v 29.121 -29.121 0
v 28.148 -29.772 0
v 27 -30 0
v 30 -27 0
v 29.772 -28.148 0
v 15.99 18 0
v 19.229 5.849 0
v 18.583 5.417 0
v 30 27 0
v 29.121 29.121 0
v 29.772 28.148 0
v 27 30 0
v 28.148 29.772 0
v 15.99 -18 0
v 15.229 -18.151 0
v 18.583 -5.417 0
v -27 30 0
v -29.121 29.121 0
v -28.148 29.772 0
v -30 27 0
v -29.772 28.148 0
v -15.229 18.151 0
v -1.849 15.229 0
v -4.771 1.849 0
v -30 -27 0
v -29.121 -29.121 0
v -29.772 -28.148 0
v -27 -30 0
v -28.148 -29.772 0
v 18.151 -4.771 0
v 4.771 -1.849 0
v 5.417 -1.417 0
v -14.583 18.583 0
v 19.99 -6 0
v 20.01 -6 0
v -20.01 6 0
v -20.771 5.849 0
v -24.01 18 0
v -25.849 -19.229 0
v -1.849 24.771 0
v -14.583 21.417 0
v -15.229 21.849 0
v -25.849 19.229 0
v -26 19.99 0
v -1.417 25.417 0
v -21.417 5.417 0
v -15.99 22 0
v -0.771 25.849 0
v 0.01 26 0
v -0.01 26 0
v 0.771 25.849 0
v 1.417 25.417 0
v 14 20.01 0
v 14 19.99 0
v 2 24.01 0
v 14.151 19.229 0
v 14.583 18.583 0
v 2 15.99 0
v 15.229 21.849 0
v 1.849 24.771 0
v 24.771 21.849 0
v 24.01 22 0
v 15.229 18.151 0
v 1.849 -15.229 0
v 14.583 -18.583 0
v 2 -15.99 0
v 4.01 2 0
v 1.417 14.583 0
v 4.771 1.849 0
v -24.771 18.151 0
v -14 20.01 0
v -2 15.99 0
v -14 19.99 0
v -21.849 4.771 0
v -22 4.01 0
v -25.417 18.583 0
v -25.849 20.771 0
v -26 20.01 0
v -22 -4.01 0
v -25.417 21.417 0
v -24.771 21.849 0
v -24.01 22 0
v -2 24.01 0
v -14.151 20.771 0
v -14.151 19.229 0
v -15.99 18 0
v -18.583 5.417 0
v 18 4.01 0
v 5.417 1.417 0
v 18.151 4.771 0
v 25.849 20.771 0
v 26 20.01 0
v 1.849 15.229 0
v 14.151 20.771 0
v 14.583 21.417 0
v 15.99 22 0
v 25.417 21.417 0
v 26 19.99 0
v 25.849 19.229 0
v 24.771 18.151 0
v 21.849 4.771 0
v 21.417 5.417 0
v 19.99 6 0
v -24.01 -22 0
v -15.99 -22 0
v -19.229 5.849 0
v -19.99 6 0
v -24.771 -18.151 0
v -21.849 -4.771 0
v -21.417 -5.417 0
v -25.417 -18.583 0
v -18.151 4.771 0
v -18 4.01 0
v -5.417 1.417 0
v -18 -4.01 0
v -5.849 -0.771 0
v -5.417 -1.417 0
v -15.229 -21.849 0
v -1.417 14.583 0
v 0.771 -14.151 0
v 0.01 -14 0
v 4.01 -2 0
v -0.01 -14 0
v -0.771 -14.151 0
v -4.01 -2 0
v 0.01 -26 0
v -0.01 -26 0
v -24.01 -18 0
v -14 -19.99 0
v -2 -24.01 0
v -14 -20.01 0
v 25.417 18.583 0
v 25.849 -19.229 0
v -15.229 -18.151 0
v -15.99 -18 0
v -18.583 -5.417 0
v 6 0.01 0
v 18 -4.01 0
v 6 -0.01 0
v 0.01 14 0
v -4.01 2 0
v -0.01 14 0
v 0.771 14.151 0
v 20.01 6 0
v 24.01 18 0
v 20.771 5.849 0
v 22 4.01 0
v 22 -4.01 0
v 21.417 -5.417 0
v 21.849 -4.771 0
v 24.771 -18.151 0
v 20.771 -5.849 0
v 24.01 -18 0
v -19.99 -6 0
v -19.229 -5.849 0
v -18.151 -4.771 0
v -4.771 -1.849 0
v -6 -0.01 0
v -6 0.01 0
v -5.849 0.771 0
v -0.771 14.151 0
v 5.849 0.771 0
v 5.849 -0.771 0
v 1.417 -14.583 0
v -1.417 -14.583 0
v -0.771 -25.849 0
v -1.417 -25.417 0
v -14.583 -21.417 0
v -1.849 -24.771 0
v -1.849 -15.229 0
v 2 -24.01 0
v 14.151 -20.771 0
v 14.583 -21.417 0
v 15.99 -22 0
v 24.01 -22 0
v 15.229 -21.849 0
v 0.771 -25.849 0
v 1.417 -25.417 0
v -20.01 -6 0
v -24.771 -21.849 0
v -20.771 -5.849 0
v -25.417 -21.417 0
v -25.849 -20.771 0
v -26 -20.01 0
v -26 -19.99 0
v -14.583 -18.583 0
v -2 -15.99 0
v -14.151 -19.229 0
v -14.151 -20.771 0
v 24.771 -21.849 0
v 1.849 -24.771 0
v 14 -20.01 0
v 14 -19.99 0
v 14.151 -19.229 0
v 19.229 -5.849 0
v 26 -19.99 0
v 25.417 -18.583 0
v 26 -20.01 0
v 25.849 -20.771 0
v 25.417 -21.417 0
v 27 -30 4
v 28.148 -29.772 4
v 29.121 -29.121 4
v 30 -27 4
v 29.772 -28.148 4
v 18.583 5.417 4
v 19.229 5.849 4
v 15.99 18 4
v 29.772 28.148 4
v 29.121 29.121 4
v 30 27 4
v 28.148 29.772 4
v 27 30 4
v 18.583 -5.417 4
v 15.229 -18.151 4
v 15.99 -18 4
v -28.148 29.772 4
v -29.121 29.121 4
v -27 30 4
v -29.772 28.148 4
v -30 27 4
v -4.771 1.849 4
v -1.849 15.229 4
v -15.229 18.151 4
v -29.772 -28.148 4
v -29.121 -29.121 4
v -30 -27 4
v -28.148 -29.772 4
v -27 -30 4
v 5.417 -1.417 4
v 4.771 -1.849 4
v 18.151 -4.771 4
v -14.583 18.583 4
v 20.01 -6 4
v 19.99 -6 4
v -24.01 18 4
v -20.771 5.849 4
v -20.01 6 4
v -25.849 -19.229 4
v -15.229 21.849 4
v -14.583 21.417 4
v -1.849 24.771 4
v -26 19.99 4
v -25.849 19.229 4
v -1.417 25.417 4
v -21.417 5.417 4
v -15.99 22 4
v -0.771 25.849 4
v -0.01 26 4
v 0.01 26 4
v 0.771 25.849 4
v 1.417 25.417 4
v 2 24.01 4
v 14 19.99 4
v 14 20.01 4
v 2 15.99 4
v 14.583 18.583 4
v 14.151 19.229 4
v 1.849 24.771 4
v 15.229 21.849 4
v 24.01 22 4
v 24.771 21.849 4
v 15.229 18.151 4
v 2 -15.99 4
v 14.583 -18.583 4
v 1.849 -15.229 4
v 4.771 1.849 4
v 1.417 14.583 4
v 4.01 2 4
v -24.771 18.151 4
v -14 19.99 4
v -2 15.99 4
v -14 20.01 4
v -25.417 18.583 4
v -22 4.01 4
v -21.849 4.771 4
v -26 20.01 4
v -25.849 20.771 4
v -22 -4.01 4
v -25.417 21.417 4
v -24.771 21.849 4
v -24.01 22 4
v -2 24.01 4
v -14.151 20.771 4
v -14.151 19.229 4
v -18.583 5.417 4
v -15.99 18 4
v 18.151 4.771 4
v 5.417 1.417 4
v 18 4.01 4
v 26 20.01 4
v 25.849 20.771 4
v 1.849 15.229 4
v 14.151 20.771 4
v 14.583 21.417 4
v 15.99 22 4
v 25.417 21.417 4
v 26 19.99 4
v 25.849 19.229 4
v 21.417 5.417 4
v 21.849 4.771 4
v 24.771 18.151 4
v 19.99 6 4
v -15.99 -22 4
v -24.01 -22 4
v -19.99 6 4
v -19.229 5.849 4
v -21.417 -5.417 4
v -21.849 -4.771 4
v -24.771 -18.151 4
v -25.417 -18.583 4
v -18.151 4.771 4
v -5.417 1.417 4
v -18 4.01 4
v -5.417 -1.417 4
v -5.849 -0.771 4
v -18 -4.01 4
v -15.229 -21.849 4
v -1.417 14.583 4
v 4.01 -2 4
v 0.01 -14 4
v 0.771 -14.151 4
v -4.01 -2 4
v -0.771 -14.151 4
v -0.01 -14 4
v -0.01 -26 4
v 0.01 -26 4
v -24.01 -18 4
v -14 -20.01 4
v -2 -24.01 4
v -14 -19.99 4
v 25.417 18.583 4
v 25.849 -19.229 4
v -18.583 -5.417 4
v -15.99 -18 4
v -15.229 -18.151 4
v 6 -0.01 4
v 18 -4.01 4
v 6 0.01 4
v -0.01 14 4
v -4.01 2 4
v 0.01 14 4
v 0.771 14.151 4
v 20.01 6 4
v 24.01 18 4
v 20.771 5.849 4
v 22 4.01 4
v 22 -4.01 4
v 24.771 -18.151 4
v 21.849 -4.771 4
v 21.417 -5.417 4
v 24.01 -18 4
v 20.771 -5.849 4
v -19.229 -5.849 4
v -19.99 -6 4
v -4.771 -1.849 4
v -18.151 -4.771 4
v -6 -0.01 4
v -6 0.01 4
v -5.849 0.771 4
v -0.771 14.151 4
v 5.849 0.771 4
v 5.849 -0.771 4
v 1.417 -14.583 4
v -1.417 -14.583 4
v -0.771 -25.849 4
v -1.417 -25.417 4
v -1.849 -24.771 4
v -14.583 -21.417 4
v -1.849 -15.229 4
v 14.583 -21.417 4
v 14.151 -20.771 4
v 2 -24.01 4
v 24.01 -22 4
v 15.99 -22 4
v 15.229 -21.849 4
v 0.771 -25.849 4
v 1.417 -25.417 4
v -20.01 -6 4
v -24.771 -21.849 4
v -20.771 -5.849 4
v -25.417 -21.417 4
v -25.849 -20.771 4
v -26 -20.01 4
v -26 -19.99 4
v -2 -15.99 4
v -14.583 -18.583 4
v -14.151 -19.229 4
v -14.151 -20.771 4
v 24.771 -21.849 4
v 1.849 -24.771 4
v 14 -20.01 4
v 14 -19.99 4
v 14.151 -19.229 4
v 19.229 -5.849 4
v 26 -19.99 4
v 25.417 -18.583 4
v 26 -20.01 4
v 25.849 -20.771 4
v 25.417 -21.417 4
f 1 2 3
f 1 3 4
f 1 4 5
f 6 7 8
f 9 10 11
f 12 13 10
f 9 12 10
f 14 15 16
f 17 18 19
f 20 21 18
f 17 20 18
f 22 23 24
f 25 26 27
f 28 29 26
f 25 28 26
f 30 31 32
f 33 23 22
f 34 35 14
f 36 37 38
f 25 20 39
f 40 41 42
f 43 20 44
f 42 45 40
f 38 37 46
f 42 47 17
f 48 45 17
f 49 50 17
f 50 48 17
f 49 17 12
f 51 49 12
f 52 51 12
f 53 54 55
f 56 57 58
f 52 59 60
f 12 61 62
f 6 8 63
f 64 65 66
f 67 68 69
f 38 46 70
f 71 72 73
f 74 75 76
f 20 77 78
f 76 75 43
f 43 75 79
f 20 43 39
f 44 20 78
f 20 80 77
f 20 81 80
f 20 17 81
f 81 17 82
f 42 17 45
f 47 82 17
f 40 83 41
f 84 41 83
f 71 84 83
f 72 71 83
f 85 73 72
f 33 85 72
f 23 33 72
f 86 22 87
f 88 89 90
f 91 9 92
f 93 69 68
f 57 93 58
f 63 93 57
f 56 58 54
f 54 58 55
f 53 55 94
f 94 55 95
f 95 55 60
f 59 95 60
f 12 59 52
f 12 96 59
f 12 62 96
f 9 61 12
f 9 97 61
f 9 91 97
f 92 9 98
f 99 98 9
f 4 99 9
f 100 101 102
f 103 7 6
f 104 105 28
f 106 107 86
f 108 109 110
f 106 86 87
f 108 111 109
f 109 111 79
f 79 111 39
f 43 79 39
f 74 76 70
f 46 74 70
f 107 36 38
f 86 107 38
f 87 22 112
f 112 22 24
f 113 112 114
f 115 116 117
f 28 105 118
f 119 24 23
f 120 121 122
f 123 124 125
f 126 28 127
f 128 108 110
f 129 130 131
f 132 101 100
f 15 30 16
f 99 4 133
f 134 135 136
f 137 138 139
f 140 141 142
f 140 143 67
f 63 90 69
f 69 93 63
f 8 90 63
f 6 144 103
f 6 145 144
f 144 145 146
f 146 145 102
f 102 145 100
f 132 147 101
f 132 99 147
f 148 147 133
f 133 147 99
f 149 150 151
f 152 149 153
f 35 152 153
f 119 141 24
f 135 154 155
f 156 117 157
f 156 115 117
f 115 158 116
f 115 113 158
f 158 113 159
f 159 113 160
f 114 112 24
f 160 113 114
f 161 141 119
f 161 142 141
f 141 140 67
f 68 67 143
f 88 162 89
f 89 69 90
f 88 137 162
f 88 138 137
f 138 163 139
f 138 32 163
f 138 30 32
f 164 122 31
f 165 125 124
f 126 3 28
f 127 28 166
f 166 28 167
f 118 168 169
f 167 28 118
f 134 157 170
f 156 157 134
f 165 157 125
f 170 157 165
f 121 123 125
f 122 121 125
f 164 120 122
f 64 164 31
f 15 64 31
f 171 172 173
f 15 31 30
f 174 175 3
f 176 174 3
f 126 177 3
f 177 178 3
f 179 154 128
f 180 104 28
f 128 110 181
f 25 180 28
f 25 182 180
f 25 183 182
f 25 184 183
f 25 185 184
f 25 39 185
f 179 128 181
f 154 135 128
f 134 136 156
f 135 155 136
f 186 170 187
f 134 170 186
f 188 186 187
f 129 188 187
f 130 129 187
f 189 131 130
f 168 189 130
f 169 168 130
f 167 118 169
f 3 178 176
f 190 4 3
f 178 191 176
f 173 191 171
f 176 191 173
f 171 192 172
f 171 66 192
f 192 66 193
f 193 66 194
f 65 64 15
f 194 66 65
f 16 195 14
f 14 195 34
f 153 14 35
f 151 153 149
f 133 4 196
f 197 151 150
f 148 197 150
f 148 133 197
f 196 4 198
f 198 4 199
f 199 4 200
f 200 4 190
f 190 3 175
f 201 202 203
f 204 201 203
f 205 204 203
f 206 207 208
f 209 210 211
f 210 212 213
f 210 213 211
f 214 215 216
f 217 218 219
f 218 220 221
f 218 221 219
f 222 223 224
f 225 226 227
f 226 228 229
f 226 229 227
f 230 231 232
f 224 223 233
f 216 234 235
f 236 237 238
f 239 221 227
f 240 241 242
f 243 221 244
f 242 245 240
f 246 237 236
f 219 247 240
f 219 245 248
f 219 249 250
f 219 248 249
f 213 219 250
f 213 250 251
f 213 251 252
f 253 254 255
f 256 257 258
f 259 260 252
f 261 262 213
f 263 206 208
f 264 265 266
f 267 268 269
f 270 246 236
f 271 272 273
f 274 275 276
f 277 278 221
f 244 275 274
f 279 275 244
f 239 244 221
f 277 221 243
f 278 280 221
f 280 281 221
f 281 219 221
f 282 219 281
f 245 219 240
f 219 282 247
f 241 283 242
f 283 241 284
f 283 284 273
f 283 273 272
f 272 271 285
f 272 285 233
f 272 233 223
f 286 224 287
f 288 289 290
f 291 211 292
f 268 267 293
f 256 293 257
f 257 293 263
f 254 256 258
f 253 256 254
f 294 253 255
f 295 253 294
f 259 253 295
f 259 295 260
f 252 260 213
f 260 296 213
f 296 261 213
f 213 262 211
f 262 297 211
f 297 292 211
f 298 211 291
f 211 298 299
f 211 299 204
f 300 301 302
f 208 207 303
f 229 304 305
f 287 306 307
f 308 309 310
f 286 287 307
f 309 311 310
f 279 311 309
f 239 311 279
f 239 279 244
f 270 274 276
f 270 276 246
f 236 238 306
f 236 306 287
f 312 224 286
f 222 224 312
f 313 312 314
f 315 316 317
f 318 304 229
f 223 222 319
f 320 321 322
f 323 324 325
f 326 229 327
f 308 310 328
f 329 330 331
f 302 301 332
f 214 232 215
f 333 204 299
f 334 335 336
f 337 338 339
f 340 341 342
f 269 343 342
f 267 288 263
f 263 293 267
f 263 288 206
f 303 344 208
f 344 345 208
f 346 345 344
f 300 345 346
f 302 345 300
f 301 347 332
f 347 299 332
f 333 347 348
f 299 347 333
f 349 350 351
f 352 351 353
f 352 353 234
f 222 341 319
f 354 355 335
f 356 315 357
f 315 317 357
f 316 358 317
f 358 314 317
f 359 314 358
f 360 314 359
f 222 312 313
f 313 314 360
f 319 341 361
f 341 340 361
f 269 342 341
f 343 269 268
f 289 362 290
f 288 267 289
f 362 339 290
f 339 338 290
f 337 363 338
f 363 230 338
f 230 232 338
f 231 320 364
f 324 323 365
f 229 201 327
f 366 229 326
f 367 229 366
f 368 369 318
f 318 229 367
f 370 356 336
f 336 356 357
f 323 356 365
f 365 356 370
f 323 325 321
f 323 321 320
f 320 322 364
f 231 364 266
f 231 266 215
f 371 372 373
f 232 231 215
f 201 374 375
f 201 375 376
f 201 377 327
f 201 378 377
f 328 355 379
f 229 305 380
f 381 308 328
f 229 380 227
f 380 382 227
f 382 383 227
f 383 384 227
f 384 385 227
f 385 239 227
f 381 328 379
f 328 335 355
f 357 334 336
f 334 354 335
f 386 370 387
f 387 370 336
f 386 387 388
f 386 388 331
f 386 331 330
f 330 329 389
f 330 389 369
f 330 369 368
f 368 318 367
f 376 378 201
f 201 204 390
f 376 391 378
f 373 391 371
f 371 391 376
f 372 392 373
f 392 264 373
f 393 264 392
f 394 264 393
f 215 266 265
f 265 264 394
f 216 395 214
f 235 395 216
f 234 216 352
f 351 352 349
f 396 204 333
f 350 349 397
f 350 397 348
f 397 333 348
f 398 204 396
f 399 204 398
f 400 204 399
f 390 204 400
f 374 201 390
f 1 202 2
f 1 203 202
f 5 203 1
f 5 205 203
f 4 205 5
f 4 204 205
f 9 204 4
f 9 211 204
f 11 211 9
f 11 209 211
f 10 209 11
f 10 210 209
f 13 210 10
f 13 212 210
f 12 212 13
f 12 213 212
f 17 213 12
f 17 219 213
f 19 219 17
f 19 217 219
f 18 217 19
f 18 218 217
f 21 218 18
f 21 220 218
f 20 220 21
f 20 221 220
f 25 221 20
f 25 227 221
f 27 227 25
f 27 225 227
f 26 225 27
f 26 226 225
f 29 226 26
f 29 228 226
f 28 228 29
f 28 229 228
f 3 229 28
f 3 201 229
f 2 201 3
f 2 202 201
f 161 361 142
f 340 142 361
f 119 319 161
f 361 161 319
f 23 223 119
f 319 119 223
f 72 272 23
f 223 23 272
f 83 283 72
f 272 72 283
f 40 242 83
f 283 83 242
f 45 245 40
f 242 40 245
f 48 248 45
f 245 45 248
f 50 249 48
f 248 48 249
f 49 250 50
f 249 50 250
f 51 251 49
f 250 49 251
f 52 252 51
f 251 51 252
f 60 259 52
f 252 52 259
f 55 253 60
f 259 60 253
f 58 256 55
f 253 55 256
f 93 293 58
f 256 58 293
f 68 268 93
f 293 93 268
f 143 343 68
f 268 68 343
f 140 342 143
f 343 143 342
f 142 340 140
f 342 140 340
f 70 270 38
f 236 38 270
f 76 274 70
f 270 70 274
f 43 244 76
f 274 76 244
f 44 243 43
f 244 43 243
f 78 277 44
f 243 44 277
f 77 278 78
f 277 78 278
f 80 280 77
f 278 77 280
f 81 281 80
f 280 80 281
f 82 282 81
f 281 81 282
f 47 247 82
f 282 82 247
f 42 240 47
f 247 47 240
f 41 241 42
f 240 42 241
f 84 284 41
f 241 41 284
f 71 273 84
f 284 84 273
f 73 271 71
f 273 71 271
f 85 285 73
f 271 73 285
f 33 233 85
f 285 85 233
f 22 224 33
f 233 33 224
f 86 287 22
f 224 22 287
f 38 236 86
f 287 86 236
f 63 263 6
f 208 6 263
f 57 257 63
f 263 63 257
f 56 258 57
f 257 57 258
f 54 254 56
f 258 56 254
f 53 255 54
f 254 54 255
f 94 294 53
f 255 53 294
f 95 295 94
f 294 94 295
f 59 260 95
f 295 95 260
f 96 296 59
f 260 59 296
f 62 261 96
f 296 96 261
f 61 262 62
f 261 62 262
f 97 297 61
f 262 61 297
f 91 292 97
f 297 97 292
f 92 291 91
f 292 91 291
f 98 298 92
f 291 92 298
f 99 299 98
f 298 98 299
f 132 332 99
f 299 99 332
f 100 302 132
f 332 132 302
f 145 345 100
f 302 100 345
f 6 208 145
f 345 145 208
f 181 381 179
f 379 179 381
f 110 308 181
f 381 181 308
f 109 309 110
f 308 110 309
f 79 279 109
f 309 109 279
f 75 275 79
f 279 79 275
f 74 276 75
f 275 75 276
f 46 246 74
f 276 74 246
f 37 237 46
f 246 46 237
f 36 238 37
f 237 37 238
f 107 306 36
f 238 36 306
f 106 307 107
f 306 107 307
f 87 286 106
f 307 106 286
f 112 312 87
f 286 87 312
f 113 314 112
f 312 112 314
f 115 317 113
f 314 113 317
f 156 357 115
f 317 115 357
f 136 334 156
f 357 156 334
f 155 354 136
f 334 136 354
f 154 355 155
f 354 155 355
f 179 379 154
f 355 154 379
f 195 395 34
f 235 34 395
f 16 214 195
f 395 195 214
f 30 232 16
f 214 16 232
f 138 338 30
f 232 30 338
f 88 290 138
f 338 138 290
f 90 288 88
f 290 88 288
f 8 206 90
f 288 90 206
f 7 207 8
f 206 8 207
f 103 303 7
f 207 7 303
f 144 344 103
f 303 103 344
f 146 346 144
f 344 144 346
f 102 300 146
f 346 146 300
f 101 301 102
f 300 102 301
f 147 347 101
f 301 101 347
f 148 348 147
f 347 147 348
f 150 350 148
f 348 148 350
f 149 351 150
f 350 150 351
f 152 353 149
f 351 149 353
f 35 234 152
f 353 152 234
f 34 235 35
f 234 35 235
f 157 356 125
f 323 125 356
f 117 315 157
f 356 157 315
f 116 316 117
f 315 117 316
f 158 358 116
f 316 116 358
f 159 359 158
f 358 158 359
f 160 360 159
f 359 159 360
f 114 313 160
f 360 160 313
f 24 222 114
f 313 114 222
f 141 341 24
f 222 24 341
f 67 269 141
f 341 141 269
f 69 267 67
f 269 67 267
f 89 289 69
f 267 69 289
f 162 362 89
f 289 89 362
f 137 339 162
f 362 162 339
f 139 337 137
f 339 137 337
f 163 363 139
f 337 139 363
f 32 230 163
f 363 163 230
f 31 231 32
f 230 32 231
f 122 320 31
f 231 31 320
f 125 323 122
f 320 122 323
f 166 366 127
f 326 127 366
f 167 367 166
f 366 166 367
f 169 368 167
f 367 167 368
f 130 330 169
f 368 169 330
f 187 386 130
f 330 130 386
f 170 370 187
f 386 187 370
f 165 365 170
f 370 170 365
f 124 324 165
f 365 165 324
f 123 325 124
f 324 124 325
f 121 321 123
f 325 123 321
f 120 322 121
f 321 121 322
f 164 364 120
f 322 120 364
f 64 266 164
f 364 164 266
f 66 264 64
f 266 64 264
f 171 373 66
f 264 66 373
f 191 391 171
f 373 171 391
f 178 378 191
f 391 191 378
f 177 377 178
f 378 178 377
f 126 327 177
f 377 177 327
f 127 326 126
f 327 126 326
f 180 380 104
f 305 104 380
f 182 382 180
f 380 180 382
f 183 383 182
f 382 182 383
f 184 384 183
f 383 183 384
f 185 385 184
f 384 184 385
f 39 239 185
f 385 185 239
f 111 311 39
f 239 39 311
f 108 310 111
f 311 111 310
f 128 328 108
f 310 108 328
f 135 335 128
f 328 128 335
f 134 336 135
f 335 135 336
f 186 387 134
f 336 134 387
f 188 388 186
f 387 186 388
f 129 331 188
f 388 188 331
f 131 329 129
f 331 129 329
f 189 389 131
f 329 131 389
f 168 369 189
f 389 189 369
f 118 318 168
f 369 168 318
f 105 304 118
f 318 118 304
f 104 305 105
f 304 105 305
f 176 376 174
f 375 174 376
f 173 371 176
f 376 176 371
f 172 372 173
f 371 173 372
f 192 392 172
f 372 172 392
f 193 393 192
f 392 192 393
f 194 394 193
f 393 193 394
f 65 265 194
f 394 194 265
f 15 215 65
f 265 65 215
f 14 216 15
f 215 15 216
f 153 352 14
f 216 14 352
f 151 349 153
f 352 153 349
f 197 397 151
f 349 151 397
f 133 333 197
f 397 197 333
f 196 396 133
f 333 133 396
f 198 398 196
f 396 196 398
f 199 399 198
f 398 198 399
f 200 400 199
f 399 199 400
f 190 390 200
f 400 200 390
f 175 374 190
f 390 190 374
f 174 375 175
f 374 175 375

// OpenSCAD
// file: ../lib/TOGComplexLib1.scad
function tcplx1_multiply(a, b) =
	[a[0]*b[0] - a[1]*b[1], a[0]*b[1] + a[1]*b[0]];
function tcplx1_divide(a, b) =
	let(bot = (b[0]*b[0] + b[1]*b[1]))
	[
		(a[0]*b[0] + a[1]*b[1])/bot,
		(a[1]*b[0] - a[0]*b[1])/bot
	];

assert([-11,23] == tcplx1_multiply([3,2], [1,7]));

assert([-1,3] == tcplx1_multiply([3,1], [0,1]));
assert([-1,3] == tcplx1_multiply([0,1], [3,1]));

echo(tcplx1_divide([-1,3], [3,1]));
assert([0,1] == tcplx1_divide([-1,3], [3,1]));

function tcplx1_normalize(vec) =
	let(veclen = sqrt(vec[0]*vec[0]+vec[1]*vec[1]))
	[vec[0] / veclen, vec[1] / veclen];

function tcplx1_relative_turnvec_vv(v0, v1) =
	tcplx1_divide(tcplx1_normalize(v1), tcplx1_normalize(v0));

function tcplx1_relative_turnvec_abc(p0, p1, p2) = tcplx1_relative_turnvec_vv(p1-p0, p2-p1);

// A 90-degree turn
assert([0,1] == tcplx1_relative_turnvec_abc([0,0], [1,0], [1,1]));
assert([0,1] == tcplx1_relative_turnvec_abc([0,0], [0,1], [-1,1]));

// A 45-degree turn
assert(tcplx1_normalize([1,1]) == tcplx1_relative_turnvec_abc([0,0], [1,0], [ 2,1]));
assert(tcplx1_normalize([1,1]) == tcplx1_relative_turnvec_abc([0,0], [0,1], [-1,2]));


function tcplx1_relative_angle_abc(p0, p1, p2) =
	let(turnvec = tcplx1_relative_turnvec_abc(p0, p1, p2))
	atan2(turnvec[1], turnvec[0]);

assert(-135 == tcplx1_relative_angle_abc([0,0], [1,0], [0,-1]));
assert( -90 == tcplx1_relative_angle_abc([0,0], [1,0], [1,-1]));
assert(   0 == tcplx1_relative_angle_abc([0,0], [1,0], [2, 0]));
assert(  90 == tcplx1_relative_angle_abc([0,0], [1,0], [1, 1]));
assert( 135 == tcplx1_relative_angle_abc([0,0], [1,0], [0, 1]));

assert(  90 == tcplx1_relative_angle_abc([1,1], [3,3], [1, 5]));
// file: ../lib/TOGArrayLib1.scad
// TOGArrayLib1.5
// 
// Functions for working with arrays.
// 
// v1.1:
// - tal1_reduce assert(is_list(items)) to prevent infinite recursion
//   when given undefined or other non-list values
// v1.1.1:
// - Fix tal1_uniq_remap_v2 to return "list-remap-result" as the
//   first element of the returned list
// v1.2:
// - Add tal1_replace_at function
// v1.3:
// - tal1_is_vec_of, tal1_is_vec_of_num
// v1.4:
// - tal1_assert_for_each, for when you want to assert something
//   about each of a list of items and get nice failure messages
// v1.5:
// - Add tal1_duplicate_reversed function, which may be
//   handy when generating symmetrical polygons and stuff.

/**
 * Make a list with the contents of list `a`,
 * but starting at offset `off`, replaced by the contents of list `b`.
 * len(result) = max(len(a), off+len(b))
 */
function tal1_replace_at(a, off, b, default_value=undef, default_value_function=undef) =
	assert(is_list(a))
	assert(is_list(b))
	let( _dvf = !is_undef(default_value_function) ? default_value_function : function(i) default_value )
[
	for( i=[0:1:min(off,len(a))-1] ) a[i],
	for( i=[len(a):1:off-1] ) _dvf(i),
	for( i=[off:1:off+len(b)-1] ) b[i-off],
	for( i=[off+len(b):1:len(a)-1] ) a[i],
];

// Simplest case
assert([] == tal1_replace_at([], 0, []));
// Second simplest cases
assert(["foo"] == tal1_replace_at(["foo"], 0, []));
assert(["foo"] == tal1_replace_at([], 0, ["foo"]));
// Replace one item
assert(["foo","quux","baz"] == tal1_replace_at(["foo","bar","baz"], 1, ["quux"]));
// Replace and extend
assert(["foo","quux","tuna","tina"] == tal1_replace_at(["foo","bar","baz"], 1, ["quux", "tuna", "tina"]));
// Add beyond end of `a`
assert(["foo","zzz","quux"] == tal1_replace_at(["foo"], 2, ["quux"], default_value="zzz"));
// Adding 'nothing' should still fill to that point with defaults
assert(["foo","zzz","zzz"] == tal1_replace_at(["foo"], 3, [], default_value="zzz"));


function tal1_reduce(start, items, func, offset=0) =
	assert(is_list(items))
	len(items) == offset ? start :
	tal1_reduce(func(start, items[offset]), items, func, offset+1);

function tal1_consecutive_duplicate_count(items) = tal1_reduce(
	[0, undef],
	items,
	function(z,item) [z[0] + (item == z[1] ? 1 : 0), item]
)[0];

assert(0 == tal1_consecutive_duplicate_count([]));
assert(0 == tal1_consecutive_duplicate_count([50]));
assert(1 == tal1_consecutive_duplicate_count([50,50]));
assert(0 == tal1_consecutive_duplicate_count([50,51,52,53]));
assert(1 == tal1_consecutive_duplicate_count([50,51,52,52]));
assert(3 == tal1_consecutive_duplicate_count([50,50,50,50]));

// Set test_size to arbirarily large values
// to ensure that OpenSCAD can handle heavy recursion
let(test_size=1000) assert(test_size/2 == tal1_consecutive_duplicate_count([for(i=[0:1:test_size-1]) floor(i/2)]));



function tal1_uniq_(items, off0, off1) =
	let(chunklen = off1-off0)
	chunklen == 0 ? [] :
	chunklen == 1 ? [items[off0]] :
	let(half=floor(chunklen/2))
	let(left  = tal1_uniq_(items, off0     , off0+half))
	let(right = tal1_uniq_(items, off0+half, off1     ))
	assert(len(left) > 0)
	assert(len(right) > 0)
	left[len(left)-1] == right[0] ? [each left, for(i=[1:1:len(right)-1]) right[i]] :
	[each left, each right];

/** Given a list of items, returns a new list with identical consecutive items merged */
function tal1_uniq(items) = tal1_uniq_(items, 0, len(items));

assert([] == tal1_uniq([]));
assert([123] == tal1_uniq([123]));
assert([55,0,1,2,3] == tal1_uniq([55,0,1,2,3]));
assert([55,0,1,2] == tal1_uniq([55,0,1,1,2]));
assert([55,0,1] == tal1_uniq([55,55,0,0,0,0,0,0,1,1,1,1]));
assert([55,0] == tal1_uniq([55,0,0,0,0,0,0,0]));



/**
 * Returns [new items, old index -> new index mapping].
 * No-op version.
 */
function tal1_uniq_remap_v1(items) =
	["list-remap-result", items, [for (vi=[0:1:len(items)-1]) vi]];

// [a, a, b, b, c, c]
//
// [a,    ...], []  -> [a],[0]
// [a, a, ...], [0] -> [a],[0,0]

assert([1,2,3] == [1,2,3]);

/**
 * Recursive version that will combine adjacent identical vertexes,
 * but will use the original items.
 */
function tal1_uniq_remap_v2(items, map=[]) =
	let(index = len(map))
	len(items) == index ? ["list-remap-result", items, map] :
	index == 0 ? tal1_uniq_remap_v2(items, [0]) :
	items[index] == items[map[index-1]] ? tal1_uniq_remap_v2(items, [for(vi=map) vi, map[index-1]]) :
	tal1_uniq_remap_v2(items, [for(vi=map) vi, index]);

assert(tal1_uniq_remap_v2([1,1,2,2,3,4]) == ["list-remap-result", [1,1,2,2,3,4], [0,0,2,2,4,5]]);


/**
 * Returns true if `vec` is a list of at least min_len items
 * and component_check(each item, even those beyond min_len) is true.
 */
function tal1_is_vec_of(vec, min_len=0, component_check=function(x) true) =
	assert(is_num(min_len) && min_len >= 0)
	assert(is_function(component_check))
	is_list(vec) && len(vec) >= min_len &&
	tal1_reduce(true, vec, function(prev,item) prev && component_check(item));

function tal1_is_vec_of_num(vec, min_len=0) = tal1_is_vec_of(vec, min_len, function(i) is_num(i));

assert( true == tal1_is_vec_of_num([1,2,3]));
assert( true == tal1_is_vec_of_num([]));
assert( true == tal1_is_vec_of_num([1,2,3], 3));
assert(false == tal1_is_vec_of_num([1,2], 3));
assert(false == tal1_is_vec_of_num([1,2,"spoon"], 3));
// Requirements are ambiguous when
// first min_len items are numbers, but there are non-numeric items afterwards,
// so let's error on the side of saying 'no, it's not a list of numbers';
// i.e. the item check and the min_len are independent.
assert(false == tal1_is_vec_of_num([1,2,3,"artichoke"], 3));


/**
 * Asserts that item_checker(each item in list, index of item)[0] is true.
 * Second element of item_checker return value is assertion message.
 * Returns the original list, in case that's useful to you.
 */
function tal1_assert_for_each(list, item_checker) =
	let( _ignored = [ for(i=[0:1:len(list)-1])
		let(q=item_checker(list[i],i))
		let(passed=is_bool(q) ? q : is_list(q) ? q[0] : assert(false, str(
			"tal1_assert_for_each: item_checker should return Bool|[Bool,String], but returned ",
			q, " for item at index ", i)))
		let(message=is_list(q) ? q[1] : undef)
		assert(passed, message)
		q
	])
	list;

// Callback can return a boolean...
assert([1,2,3] == tal1_assert_for_each([1,2,3], function(v,i) is_num(v)));
// ...or a [boolean, string]
assert([1,2,3] == tal1_assert_for_each([1,2,3], function(v,i) [is_num(v), "element be a num"]));

// [a, b, c] -> [a, b, c, rxf(c), rxf(b), rxf(a)]
function tal1_duplicate_reversed(list, rxf=function(item) item) =
	[
		each list,
		for( i=[len(list)-1 : -1 : 0] ) rxf(list[i]),
	];
// file: ../lib/TOGMod1Constructors.scad
// TOGMod1Constructors-v1.11
// 
// Functions to construct objects understood by TOGMod1
// 
// v1.1:
// - Add togmod1_make_rounded_rect
// v1.2:
// - togmod1_make_rounded_rect can make ovals
// v1.3:
// - togmod1_circle_points, to just get the points of a circle
// - if pos parameter to circle function has a third element,
//   returned vertexes will include it as the z component;
// v1.3.1
// - Some assertions
// v1.4:
// - Refactor togmod1_rounded_rect_points and togmod1_circle_points
//   to use togmod1__make_nd_vector_adder for adapting to whatever
//   `pos` parameter is.
// v1.5:
// - togmod_rounded_rect_points will not simplify completely rounded sides
//   (where length of side is exactly twice the rounding radius)
//   unless simplify_rounded_sides=true
//   - This makes it more useful for polyhedron generation,
//     where radius varies, but number of points must remain constant.
// v1.6:
// - togmod1_make_rect makes a simple rectangle
// - togmod1_make_rounded_rect will defer to togmod1_make_rect when r=0
// v1.7:
// - togmod1_make_circle will return empty shape (["union"]) when d=0
// v1.8:
// - Add togmod1_text
// v1.9:
// - togmod1_circle_points uses 3 as minimum circle point count instead of 6
// v1.10:
// - Fix togmod1_linear_extrude_y so that range corresponds to Y start/end and
//   polygon X,Y correspond to X,Z.  Previously it was rotated wrongly,
//   which would have gone unnoticed for symmetrical shapes centered at 0,0.
// v1.11:
// - Remove an 'echo'

use <./TOGArrayLib1.scad>

function togmod1__make_nd_vector_adder(origin=[0,0]) =
	let(origin_is_zero = tal1_reduce(true, origin, function(prev,item) prev && item == 0))
	origin_is_zero ? (function(vec) len(vec) >= len(origin) ? vec : tal1_replace_at(origin, 0, vec)) :
	function(vec) [
		for(i=[0:1:max(len(origin),len(vec))-1]) (len(vec) > i ? vec[i] : 0) + (len(origin) > i ? origin[i] : 0),
	];

assert([1,2,3] == togmod1__make_nd_vector_adder()([1,2,3]));
assert([1,2,3] == togmod1__make_nd_vector_adder([0,0,3])([1,2]));


function togmod1_make_cuboid(size) =
	assert(is_list(size))
	assert(len(size) >= 3)
	assert(is_num(size[0]))
	assert(is_num(size[1]))
	assert(is_num(size[2]))
	["polyhedron-vf", [
		[-size[0]/2, -size[1]/2, -size[2]/2],
		[+size[0]/2, -size[1]/2, -size[2]/2],
		[-size[0]/2, +size[1]/2, -size[2]/2],
		[+size[0]/2, +size[1]/2, -size[2]/2],
		[-size[0]/2, -size[1]/2, +size[2]/2],
		[+size[0]/2, -size[1]/2, +size[2]/2],
		[-size[0]/2, +size[1]/2, +size[2]/2],
		[+size[0]/2, +size[1]/2, +size[2]/2]
	], [
		[0,1,3,2],[0,4,5,1],[4,6,7,5],[3,7,6,2],[1,5,7,3],[6,4,0,2]
	]];

function togmod1_make_polygon(verts) =
	["polygon-vp", verts, [[for( i=[0:1:len(verts)-1] ) i%len(verts)]]];

function togmod1_rounded_rect_points(size, r, pos=[0,0], simplify_rounded_sides=false) =
	assert(is_list(size))
	assert(len(size) >= 2)
	let(radii = is_list(r) ? r : is_num(r) ? [r,r] : assert(false, "rounded_rect r(adius) should be list<num> or num"))
	let(rx = radii[0])
	let(ry = radii[1])
	assert(is_num(rx))
	assert(is_num(ry))
	assert(size[0] >= 2*rx, str("size[0] must be >= 2*r[0]; size[0] = ",size[0],", 2*r[0] = ",2*rx))
	assert(size[1] >= 2*ry, str("size[1] must be >= 2*r[1]; size[1] = ",size[1],", 2*r[1] = ",2*ry))
	let(quarterfn=max($fn/4, 1))
	let(qfnx = simplify_rounded_sides && size[0] == 2*rx ? quarterfn-1 : quarterfn)
	let(qfny = simplify_rounded_sides && size[1] == 2*ry ? quarterfn-1 : quarterfn)
	let(finalizepos = togmod1__make_nd_vector_adder(pos))
[
	for(a=[0 : 1 : qfnx]) let(ang=      a*90/quarterfn) finalizepos([ size[0]/2-rx + rx*cos(ang),  size[1]/2-ry + ry*sin(ang)]),
	for(a=[0 : 1 : qfny]) let(ang= 90 + a*90/quarterfn) finalizepos([-size[0]/2+rx + rx*cos(ang),  size[1]/2-ry + ry*sin(ang)]),
	for(a=[0 : 1 : qfnx]) let(ang=180 + a*90/quarterfn) finalizepos([-size[0]/2+rx + rx*cos(ang), -size[1]/2+ry + ry*sin(ang)]),
	for(a=[0 : 1 : qfny]) let(ang=270 + a*90/quarterfn) finalizepos([ size[0]/2-rx + rx*cos(ang), -size[1]/2+ry + ry*sin(ang)]),
];

function togmod1_make_rect(size) =
	togmod1_make_polygon([
		[-size[0]/2, -size[1]/2],
		[+size[0]/2, -size[1]/2],
		[+size[0]/2, +size[1]/2],
		[-size[0]/2, +size[1]/2],
	]);

function togmod1_make_rounded_rect(size, r) =
	r == 0 ? togmod1_make_rect(size) :
	togmod1_make_polygon(togmod1_rounded_rect_points(size,r,simplify_rounded_sides=true));

/**
 * Returns points for an approximation of a circle where points are at distance r from pos.
 * Can be used to make other regular polygons, but the faces will be less than that
 * distance from pos (do some trig if you want face distance, e.g. for a hex nut).
 */
function togmod1_circle_points(r, pos=[0,0], d=undef) =
	assert( !is_undef(r) || !is_undef(d) )
	assert(!is_undef(pos[0]))
	assert(!is_undef(pos[1]))
	let(finalizepos = togmod1__make_nd_vector_adder(pos))
	let(r_ = !is_undef(r) ? r : d/2)
	let(fn = max($fn, 3))
	[for(i=[0 : 1 : fn-1]) finalizepos([r_*cos(i*360/fn), r_*sin(i*360/fn)])];

function togmod1_make_circle(r, pos=[0,0], d=undef) =
	r == 0 || d == 0 ? ["union"] :
	togmod1_make_polygon(togmod1_circle_points(r=r, pos=pos, d=d));

function togmod1_make_cylinder(d, zrange=[0,1], r=undef, pos=[0,0]) =
	assert( !is_undef(r) || !is_undef(d) )
	let( r_ = !is_undef(r) ? r : d/2 )
	// TODO: Make polyhedron directly
	["linear-extrude-zs", zrange, togmod1_make_circle(r=r_, pos=pos)];

function togmod1__is_range1d(range) = is_list(range) && len(range) == 2 && is_num(range[0]) && is_num(range[1]);

function togmod1_linear_extrude_z(range, shape) =
	assert(togmod1__is_range1d(range))
	["linear-extrude-zs", range, shape];
function togmod1_linear_extrude_x(range, shape) =
	assert(togmod1__is_range1d(range))
	["rotate", [90, 0, 90], togmod1_linear_extrude_z(range, shape)];
function togmod1_linear_extrude_y(range, shape) =
	assert(togmod1__is_range1d(range))
	["rotate", [90, 0,  0], togmod1_linear_extrude_z([-range[1], -range[0]], shape)];

function togmod1_text(text, size, font, halign, valign, spacing, direction, language, script) =
	["text-tsfhvsdls", text, size, font, halign, valign, spacing, direction, language, script];
// file: ../lib/TOGMod1.scad
// TOGMod1.9
// OpenSCAD library for representing shapes
// 
// See also: Functional OpenSCAD (https://github.com/thehans/FunctionalOpenSCAD)
// 
// v1.8:
// - Add `text-tsfhvsdls`
// v1.9
// - Add `offset-ds` (offset with _d_elta a _s_hape)

module togmod1_domodule(mod) {
	assert(is_list(mod));
	assert(len(mod) > 0);
	if( mod[0] == "polygon-vp" ) {
		// ["polygon-vp", vertexes, paths]
		polygon(points=mod[1], paths=mod[2]);
	} else if( mod[0] == "polyhedron-vf" ) {
		polyhedron(mod[1], faces=mod[2]);
	} else if( mod[0] == "scale" ) {
		assert(len(mod) == 3);
		scale(mod[1]) togmod1_domodule(mod[2]);
	} else if( mod[0] == "translate" ) {
		assert(len(mod) == 3);
		assert(is_list(mod[1]));
		for(c=mod[1]) assert(is_num(c), "translate component should be numeric");
		translate(mod[1]) togmod1_domodule(mod[2]);
	} else if( mod[0] == "rotate" ) {
		assert(len(mod) == 3);
		rotate(mod[1]) togmod1_domodule(mod[2]);
	} else if( mod[0] == "intersection" ) {
		intersection_for( i=[1:1:len(mod)-1] ) togmod1_domodule(mod[i]);
	} else if( mod[0] == "difference" ) {
		difference() {
			togmod1_domodule(mod[1]);
			for( i=[2:1:len(mod)-1] ) togmod1_domodule(mod[i]);
		}
	} else if( mod[0] == "union" ) {
		for( i=[1:1:len(mod)-1] ) togmod1_domodule(mod[i]);
	} else if( mod[0] == "hull" ) {
		hull() for( i=[1:1:len(mod)-1] ) togmod1_domodule(mod[i]);
	} else if( mod[0] == "offset-rs" ) {
		assert(len(mod) == 3);
		assert(is_num(mod[1]));
		assert(is_list(mod[2]));
		offset(mod[1]) togmod1_domodule(mod[2]);
	} else if( mod[0] == "linear-extrude-zs" ) {
		// ["linear-extrude-zs", [z0,z1], 2d_shape] // centered
		// ["linear-extrude-zs", height, 2d_shape]
		let( zrange = is_list(mod[1]) ? mod[1] : [-mod[1]/2, mod[1]/2] ) {
			translate([0,0,zrange[0]]) linear_extrude(zrange[1]-zrange[0]) togmod1_domodule(mod[2]);
		}
	} else if( mod[0] == "render" ) {
		render() togmod1_domodule(mod[1]);
	} else if( mod[0] == "minkowski" ) {
		minkowski() {
			togmod1_domodule(mod[1]);
			togmod1_domodule(mod[2]);
		}
	} else if( mod[0] == "x-debug" ) {
		# togmod1_domodule(mod[1]);
	} else if( mod[0] == "x-color" ) {
		color(mod[1]) togmod1_domodule(mod[2]);
	} else if( mod[0] == "text-tsfhvsdls" ) {
		text(text=mod[1], size=mod[2], font=mod[3], halign=mod[4], valign=mod[5], spacing=mod[6], direction=mod[7], language=mod[7], script=mod[8]);
	} else if( mod[0] == "offset-ds" ) {
		assert(is_num(mod[1]));
		assert(is_list(mod[2]));
		offset(delta=mod[1]) togmod1_domodule(mod[2]);
	} else {
		assert(false, str("Unrecognized shape: ", mod[0]));
	}
}
// main file
// SlottedPlate1.0
// 
// A simple slotted plate for attaching 2020 rails or gridbeams or whatever.

chunk_pitch = 20;
size_chunks = [3,3];
slot_size = [12.0, 4.0];

thickness = 4;
alternate_slot_direction = true;

$fn = 20;

use <../lib/TOGMod1.scad>
use <../lib/TOGMod1Constructors.scad>
use <../lib/TOGPath1.scad>

togmod1_domodule(
	let(rath2poly = function(rath) togmod1_make_polygon(togpath1_rath_to_polypoints(rath)))
	let(slot = rath2poly(togpath1_make_rectangle_rath(slot_size, corner_ops=[["round", min(slot_size[0],slot_size[1])/2.01]])))
	togmod1_linear_extrude_z([0,thickness], ["difference",
		rath2poly(togpath1_make_rectangle_rath(size_chunks*chunk_pitch, corner_ops=[["round", 3]])),
		
		for( cy=[-size_chunks[1]/2 + 0.5 : 1 : size_chunks[1]/2] )
		for( cx=[-size_chunks[0]/2 + 0.5 : 1 : size_chunks[0]/2] )
		["translate", [cx,cy]*chunk_pitch, ["rotate", [0,0,(alternate_slot_direction?90:0)*(floor(cx)+floor(cy))], slot]],
	])
);
